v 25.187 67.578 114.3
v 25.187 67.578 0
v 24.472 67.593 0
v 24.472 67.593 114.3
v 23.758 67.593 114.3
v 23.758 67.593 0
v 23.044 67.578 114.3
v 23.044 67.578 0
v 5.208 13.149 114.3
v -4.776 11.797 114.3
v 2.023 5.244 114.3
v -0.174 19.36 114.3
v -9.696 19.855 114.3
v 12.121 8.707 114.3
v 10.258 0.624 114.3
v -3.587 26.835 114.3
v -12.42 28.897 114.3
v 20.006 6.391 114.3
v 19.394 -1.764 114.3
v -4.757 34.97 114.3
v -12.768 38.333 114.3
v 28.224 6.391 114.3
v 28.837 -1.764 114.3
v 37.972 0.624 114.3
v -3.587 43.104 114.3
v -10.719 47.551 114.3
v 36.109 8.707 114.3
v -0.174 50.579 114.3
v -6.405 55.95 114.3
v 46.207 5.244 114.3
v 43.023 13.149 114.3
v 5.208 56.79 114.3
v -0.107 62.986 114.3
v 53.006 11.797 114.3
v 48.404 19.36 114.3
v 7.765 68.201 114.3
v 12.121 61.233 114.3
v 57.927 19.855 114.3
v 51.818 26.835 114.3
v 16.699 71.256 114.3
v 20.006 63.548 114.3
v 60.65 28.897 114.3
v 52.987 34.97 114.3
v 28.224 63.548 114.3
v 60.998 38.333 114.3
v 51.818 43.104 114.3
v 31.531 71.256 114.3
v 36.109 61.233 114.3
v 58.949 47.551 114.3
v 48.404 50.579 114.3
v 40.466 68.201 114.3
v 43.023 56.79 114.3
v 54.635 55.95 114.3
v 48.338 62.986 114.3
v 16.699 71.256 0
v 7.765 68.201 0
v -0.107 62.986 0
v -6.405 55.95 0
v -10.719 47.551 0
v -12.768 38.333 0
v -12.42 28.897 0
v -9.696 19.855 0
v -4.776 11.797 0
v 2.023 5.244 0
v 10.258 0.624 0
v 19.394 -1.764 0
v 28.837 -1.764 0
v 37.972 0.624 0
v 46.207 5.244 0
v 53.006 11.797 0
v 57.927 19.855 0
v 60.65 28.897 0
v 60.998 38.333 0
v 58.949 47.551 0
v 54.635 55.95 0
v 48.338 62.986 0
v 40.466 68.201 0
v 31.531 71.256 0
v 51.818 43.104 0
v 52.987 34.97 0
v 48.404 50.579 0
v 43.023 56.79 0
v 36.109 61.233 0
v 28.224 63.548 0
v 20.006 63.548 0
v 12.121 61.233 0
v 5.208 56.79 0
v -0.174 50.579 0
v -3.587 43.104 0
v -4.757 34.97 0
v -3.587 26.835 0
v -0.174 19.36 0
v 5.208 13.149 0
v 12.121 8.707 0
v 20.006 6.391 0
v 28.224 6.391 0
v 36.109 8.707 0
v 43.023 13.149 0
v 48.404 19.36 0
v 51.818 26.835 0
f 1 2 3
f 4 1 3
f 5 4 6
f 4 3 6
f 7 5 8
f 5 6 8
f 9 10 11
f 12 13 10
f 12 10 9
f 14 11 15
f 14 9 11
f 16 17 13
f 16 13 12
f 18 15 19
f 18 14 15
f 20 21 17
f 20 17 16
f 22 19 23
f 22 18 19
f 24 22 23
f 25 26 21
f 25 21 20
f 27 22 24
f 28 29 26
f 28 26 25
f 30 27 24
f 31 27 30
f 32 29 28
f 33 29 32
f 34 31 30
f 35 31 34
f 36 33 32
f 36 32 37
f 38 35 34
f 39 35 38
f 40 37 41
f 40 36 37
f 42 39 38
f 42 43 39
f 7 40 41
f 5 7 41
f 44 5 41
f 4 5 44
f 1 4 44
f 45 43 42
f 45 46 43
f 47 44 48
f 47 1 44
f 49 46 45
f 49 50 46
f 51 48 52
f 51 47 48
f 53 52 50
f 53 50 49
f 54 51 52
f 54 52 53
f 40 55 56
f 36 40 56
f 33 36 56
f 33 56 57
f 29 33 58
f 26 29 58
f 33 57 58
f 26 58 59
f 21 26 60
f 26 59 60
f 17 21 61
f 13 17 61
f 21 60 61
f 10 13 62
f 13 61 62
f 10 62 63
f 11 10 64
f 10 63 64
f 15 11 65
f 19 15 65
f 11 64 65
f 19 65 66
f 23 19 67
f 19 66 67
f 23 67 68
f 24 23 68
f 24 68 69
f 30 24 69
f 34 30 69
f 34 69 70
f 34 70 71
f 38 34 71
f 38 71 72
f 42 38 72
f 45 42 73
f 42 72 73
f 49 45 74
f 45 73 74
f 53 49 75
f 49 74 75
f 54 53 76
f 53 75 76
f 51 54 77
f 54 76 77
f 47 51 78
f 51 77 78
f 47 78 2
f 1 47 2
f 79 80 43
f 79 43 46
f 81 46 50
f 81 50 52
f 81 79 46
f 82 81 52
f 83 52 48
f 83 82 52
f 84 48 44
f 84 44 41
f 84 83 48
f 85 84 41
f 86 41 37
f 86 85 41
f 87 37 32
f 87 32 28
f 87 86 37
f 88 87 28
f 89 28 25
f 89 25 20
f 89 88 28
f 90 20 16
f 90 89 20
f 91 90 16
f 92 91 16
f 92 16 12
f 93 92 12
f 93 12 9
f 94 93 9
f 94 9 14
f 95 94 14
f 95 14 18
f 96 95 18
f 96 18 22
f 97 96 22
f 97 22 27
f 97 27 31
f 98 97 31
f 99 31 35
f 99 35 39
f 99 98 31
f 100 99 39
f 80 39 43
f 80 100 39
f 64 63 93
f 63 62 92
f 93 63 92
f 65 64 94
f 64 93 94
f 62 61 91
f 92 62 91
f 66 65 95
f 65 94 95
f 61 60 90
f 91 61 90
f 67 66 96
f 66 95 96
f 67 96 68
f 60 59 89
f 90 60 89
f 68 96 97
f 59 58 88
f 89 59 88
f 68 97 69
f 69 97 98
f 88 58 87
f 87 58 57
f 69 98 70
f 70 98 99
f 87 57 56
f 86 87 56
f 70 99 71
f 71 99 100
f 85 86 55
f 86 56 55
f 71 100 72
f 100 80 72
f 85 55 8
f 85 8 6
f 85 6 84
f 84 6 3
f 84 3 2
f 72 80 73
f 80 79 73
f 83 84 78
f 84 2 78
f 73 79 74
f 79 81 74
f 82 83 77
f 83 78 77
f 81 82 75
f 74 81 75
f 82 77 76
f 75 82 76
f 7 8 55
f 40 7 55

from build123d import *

# Parameters (mm, degrees)
F0_R     = 28.872243
F1_DEPTH = 114.3


with BuildPart() as f1:
    # F0 (on Top) → F1 (new body)
    with BuildSketch(Plane.XY):
        with BuildLine():
            ThreePointArc((16.699345, 71.255645), (24.115243, -2.066448), (31.531141, 71.255645))
            Line((31.531141, 71.255645), (25.186695, 67.577745))
            ThreePointArc((25.186695, 67.577745), (24.115243, 67.595343), (23.043791, 67.577745))
            Line((23.043791, 67.577745), (16.699345, 71.255645))
        make_face()
        with Locations((24.115243, 34.969625)):
            Circle(F0_R, mode=Mode.SUBTRACT)
    extrude(amount=F1_DEPTH)


solid = f1.part
